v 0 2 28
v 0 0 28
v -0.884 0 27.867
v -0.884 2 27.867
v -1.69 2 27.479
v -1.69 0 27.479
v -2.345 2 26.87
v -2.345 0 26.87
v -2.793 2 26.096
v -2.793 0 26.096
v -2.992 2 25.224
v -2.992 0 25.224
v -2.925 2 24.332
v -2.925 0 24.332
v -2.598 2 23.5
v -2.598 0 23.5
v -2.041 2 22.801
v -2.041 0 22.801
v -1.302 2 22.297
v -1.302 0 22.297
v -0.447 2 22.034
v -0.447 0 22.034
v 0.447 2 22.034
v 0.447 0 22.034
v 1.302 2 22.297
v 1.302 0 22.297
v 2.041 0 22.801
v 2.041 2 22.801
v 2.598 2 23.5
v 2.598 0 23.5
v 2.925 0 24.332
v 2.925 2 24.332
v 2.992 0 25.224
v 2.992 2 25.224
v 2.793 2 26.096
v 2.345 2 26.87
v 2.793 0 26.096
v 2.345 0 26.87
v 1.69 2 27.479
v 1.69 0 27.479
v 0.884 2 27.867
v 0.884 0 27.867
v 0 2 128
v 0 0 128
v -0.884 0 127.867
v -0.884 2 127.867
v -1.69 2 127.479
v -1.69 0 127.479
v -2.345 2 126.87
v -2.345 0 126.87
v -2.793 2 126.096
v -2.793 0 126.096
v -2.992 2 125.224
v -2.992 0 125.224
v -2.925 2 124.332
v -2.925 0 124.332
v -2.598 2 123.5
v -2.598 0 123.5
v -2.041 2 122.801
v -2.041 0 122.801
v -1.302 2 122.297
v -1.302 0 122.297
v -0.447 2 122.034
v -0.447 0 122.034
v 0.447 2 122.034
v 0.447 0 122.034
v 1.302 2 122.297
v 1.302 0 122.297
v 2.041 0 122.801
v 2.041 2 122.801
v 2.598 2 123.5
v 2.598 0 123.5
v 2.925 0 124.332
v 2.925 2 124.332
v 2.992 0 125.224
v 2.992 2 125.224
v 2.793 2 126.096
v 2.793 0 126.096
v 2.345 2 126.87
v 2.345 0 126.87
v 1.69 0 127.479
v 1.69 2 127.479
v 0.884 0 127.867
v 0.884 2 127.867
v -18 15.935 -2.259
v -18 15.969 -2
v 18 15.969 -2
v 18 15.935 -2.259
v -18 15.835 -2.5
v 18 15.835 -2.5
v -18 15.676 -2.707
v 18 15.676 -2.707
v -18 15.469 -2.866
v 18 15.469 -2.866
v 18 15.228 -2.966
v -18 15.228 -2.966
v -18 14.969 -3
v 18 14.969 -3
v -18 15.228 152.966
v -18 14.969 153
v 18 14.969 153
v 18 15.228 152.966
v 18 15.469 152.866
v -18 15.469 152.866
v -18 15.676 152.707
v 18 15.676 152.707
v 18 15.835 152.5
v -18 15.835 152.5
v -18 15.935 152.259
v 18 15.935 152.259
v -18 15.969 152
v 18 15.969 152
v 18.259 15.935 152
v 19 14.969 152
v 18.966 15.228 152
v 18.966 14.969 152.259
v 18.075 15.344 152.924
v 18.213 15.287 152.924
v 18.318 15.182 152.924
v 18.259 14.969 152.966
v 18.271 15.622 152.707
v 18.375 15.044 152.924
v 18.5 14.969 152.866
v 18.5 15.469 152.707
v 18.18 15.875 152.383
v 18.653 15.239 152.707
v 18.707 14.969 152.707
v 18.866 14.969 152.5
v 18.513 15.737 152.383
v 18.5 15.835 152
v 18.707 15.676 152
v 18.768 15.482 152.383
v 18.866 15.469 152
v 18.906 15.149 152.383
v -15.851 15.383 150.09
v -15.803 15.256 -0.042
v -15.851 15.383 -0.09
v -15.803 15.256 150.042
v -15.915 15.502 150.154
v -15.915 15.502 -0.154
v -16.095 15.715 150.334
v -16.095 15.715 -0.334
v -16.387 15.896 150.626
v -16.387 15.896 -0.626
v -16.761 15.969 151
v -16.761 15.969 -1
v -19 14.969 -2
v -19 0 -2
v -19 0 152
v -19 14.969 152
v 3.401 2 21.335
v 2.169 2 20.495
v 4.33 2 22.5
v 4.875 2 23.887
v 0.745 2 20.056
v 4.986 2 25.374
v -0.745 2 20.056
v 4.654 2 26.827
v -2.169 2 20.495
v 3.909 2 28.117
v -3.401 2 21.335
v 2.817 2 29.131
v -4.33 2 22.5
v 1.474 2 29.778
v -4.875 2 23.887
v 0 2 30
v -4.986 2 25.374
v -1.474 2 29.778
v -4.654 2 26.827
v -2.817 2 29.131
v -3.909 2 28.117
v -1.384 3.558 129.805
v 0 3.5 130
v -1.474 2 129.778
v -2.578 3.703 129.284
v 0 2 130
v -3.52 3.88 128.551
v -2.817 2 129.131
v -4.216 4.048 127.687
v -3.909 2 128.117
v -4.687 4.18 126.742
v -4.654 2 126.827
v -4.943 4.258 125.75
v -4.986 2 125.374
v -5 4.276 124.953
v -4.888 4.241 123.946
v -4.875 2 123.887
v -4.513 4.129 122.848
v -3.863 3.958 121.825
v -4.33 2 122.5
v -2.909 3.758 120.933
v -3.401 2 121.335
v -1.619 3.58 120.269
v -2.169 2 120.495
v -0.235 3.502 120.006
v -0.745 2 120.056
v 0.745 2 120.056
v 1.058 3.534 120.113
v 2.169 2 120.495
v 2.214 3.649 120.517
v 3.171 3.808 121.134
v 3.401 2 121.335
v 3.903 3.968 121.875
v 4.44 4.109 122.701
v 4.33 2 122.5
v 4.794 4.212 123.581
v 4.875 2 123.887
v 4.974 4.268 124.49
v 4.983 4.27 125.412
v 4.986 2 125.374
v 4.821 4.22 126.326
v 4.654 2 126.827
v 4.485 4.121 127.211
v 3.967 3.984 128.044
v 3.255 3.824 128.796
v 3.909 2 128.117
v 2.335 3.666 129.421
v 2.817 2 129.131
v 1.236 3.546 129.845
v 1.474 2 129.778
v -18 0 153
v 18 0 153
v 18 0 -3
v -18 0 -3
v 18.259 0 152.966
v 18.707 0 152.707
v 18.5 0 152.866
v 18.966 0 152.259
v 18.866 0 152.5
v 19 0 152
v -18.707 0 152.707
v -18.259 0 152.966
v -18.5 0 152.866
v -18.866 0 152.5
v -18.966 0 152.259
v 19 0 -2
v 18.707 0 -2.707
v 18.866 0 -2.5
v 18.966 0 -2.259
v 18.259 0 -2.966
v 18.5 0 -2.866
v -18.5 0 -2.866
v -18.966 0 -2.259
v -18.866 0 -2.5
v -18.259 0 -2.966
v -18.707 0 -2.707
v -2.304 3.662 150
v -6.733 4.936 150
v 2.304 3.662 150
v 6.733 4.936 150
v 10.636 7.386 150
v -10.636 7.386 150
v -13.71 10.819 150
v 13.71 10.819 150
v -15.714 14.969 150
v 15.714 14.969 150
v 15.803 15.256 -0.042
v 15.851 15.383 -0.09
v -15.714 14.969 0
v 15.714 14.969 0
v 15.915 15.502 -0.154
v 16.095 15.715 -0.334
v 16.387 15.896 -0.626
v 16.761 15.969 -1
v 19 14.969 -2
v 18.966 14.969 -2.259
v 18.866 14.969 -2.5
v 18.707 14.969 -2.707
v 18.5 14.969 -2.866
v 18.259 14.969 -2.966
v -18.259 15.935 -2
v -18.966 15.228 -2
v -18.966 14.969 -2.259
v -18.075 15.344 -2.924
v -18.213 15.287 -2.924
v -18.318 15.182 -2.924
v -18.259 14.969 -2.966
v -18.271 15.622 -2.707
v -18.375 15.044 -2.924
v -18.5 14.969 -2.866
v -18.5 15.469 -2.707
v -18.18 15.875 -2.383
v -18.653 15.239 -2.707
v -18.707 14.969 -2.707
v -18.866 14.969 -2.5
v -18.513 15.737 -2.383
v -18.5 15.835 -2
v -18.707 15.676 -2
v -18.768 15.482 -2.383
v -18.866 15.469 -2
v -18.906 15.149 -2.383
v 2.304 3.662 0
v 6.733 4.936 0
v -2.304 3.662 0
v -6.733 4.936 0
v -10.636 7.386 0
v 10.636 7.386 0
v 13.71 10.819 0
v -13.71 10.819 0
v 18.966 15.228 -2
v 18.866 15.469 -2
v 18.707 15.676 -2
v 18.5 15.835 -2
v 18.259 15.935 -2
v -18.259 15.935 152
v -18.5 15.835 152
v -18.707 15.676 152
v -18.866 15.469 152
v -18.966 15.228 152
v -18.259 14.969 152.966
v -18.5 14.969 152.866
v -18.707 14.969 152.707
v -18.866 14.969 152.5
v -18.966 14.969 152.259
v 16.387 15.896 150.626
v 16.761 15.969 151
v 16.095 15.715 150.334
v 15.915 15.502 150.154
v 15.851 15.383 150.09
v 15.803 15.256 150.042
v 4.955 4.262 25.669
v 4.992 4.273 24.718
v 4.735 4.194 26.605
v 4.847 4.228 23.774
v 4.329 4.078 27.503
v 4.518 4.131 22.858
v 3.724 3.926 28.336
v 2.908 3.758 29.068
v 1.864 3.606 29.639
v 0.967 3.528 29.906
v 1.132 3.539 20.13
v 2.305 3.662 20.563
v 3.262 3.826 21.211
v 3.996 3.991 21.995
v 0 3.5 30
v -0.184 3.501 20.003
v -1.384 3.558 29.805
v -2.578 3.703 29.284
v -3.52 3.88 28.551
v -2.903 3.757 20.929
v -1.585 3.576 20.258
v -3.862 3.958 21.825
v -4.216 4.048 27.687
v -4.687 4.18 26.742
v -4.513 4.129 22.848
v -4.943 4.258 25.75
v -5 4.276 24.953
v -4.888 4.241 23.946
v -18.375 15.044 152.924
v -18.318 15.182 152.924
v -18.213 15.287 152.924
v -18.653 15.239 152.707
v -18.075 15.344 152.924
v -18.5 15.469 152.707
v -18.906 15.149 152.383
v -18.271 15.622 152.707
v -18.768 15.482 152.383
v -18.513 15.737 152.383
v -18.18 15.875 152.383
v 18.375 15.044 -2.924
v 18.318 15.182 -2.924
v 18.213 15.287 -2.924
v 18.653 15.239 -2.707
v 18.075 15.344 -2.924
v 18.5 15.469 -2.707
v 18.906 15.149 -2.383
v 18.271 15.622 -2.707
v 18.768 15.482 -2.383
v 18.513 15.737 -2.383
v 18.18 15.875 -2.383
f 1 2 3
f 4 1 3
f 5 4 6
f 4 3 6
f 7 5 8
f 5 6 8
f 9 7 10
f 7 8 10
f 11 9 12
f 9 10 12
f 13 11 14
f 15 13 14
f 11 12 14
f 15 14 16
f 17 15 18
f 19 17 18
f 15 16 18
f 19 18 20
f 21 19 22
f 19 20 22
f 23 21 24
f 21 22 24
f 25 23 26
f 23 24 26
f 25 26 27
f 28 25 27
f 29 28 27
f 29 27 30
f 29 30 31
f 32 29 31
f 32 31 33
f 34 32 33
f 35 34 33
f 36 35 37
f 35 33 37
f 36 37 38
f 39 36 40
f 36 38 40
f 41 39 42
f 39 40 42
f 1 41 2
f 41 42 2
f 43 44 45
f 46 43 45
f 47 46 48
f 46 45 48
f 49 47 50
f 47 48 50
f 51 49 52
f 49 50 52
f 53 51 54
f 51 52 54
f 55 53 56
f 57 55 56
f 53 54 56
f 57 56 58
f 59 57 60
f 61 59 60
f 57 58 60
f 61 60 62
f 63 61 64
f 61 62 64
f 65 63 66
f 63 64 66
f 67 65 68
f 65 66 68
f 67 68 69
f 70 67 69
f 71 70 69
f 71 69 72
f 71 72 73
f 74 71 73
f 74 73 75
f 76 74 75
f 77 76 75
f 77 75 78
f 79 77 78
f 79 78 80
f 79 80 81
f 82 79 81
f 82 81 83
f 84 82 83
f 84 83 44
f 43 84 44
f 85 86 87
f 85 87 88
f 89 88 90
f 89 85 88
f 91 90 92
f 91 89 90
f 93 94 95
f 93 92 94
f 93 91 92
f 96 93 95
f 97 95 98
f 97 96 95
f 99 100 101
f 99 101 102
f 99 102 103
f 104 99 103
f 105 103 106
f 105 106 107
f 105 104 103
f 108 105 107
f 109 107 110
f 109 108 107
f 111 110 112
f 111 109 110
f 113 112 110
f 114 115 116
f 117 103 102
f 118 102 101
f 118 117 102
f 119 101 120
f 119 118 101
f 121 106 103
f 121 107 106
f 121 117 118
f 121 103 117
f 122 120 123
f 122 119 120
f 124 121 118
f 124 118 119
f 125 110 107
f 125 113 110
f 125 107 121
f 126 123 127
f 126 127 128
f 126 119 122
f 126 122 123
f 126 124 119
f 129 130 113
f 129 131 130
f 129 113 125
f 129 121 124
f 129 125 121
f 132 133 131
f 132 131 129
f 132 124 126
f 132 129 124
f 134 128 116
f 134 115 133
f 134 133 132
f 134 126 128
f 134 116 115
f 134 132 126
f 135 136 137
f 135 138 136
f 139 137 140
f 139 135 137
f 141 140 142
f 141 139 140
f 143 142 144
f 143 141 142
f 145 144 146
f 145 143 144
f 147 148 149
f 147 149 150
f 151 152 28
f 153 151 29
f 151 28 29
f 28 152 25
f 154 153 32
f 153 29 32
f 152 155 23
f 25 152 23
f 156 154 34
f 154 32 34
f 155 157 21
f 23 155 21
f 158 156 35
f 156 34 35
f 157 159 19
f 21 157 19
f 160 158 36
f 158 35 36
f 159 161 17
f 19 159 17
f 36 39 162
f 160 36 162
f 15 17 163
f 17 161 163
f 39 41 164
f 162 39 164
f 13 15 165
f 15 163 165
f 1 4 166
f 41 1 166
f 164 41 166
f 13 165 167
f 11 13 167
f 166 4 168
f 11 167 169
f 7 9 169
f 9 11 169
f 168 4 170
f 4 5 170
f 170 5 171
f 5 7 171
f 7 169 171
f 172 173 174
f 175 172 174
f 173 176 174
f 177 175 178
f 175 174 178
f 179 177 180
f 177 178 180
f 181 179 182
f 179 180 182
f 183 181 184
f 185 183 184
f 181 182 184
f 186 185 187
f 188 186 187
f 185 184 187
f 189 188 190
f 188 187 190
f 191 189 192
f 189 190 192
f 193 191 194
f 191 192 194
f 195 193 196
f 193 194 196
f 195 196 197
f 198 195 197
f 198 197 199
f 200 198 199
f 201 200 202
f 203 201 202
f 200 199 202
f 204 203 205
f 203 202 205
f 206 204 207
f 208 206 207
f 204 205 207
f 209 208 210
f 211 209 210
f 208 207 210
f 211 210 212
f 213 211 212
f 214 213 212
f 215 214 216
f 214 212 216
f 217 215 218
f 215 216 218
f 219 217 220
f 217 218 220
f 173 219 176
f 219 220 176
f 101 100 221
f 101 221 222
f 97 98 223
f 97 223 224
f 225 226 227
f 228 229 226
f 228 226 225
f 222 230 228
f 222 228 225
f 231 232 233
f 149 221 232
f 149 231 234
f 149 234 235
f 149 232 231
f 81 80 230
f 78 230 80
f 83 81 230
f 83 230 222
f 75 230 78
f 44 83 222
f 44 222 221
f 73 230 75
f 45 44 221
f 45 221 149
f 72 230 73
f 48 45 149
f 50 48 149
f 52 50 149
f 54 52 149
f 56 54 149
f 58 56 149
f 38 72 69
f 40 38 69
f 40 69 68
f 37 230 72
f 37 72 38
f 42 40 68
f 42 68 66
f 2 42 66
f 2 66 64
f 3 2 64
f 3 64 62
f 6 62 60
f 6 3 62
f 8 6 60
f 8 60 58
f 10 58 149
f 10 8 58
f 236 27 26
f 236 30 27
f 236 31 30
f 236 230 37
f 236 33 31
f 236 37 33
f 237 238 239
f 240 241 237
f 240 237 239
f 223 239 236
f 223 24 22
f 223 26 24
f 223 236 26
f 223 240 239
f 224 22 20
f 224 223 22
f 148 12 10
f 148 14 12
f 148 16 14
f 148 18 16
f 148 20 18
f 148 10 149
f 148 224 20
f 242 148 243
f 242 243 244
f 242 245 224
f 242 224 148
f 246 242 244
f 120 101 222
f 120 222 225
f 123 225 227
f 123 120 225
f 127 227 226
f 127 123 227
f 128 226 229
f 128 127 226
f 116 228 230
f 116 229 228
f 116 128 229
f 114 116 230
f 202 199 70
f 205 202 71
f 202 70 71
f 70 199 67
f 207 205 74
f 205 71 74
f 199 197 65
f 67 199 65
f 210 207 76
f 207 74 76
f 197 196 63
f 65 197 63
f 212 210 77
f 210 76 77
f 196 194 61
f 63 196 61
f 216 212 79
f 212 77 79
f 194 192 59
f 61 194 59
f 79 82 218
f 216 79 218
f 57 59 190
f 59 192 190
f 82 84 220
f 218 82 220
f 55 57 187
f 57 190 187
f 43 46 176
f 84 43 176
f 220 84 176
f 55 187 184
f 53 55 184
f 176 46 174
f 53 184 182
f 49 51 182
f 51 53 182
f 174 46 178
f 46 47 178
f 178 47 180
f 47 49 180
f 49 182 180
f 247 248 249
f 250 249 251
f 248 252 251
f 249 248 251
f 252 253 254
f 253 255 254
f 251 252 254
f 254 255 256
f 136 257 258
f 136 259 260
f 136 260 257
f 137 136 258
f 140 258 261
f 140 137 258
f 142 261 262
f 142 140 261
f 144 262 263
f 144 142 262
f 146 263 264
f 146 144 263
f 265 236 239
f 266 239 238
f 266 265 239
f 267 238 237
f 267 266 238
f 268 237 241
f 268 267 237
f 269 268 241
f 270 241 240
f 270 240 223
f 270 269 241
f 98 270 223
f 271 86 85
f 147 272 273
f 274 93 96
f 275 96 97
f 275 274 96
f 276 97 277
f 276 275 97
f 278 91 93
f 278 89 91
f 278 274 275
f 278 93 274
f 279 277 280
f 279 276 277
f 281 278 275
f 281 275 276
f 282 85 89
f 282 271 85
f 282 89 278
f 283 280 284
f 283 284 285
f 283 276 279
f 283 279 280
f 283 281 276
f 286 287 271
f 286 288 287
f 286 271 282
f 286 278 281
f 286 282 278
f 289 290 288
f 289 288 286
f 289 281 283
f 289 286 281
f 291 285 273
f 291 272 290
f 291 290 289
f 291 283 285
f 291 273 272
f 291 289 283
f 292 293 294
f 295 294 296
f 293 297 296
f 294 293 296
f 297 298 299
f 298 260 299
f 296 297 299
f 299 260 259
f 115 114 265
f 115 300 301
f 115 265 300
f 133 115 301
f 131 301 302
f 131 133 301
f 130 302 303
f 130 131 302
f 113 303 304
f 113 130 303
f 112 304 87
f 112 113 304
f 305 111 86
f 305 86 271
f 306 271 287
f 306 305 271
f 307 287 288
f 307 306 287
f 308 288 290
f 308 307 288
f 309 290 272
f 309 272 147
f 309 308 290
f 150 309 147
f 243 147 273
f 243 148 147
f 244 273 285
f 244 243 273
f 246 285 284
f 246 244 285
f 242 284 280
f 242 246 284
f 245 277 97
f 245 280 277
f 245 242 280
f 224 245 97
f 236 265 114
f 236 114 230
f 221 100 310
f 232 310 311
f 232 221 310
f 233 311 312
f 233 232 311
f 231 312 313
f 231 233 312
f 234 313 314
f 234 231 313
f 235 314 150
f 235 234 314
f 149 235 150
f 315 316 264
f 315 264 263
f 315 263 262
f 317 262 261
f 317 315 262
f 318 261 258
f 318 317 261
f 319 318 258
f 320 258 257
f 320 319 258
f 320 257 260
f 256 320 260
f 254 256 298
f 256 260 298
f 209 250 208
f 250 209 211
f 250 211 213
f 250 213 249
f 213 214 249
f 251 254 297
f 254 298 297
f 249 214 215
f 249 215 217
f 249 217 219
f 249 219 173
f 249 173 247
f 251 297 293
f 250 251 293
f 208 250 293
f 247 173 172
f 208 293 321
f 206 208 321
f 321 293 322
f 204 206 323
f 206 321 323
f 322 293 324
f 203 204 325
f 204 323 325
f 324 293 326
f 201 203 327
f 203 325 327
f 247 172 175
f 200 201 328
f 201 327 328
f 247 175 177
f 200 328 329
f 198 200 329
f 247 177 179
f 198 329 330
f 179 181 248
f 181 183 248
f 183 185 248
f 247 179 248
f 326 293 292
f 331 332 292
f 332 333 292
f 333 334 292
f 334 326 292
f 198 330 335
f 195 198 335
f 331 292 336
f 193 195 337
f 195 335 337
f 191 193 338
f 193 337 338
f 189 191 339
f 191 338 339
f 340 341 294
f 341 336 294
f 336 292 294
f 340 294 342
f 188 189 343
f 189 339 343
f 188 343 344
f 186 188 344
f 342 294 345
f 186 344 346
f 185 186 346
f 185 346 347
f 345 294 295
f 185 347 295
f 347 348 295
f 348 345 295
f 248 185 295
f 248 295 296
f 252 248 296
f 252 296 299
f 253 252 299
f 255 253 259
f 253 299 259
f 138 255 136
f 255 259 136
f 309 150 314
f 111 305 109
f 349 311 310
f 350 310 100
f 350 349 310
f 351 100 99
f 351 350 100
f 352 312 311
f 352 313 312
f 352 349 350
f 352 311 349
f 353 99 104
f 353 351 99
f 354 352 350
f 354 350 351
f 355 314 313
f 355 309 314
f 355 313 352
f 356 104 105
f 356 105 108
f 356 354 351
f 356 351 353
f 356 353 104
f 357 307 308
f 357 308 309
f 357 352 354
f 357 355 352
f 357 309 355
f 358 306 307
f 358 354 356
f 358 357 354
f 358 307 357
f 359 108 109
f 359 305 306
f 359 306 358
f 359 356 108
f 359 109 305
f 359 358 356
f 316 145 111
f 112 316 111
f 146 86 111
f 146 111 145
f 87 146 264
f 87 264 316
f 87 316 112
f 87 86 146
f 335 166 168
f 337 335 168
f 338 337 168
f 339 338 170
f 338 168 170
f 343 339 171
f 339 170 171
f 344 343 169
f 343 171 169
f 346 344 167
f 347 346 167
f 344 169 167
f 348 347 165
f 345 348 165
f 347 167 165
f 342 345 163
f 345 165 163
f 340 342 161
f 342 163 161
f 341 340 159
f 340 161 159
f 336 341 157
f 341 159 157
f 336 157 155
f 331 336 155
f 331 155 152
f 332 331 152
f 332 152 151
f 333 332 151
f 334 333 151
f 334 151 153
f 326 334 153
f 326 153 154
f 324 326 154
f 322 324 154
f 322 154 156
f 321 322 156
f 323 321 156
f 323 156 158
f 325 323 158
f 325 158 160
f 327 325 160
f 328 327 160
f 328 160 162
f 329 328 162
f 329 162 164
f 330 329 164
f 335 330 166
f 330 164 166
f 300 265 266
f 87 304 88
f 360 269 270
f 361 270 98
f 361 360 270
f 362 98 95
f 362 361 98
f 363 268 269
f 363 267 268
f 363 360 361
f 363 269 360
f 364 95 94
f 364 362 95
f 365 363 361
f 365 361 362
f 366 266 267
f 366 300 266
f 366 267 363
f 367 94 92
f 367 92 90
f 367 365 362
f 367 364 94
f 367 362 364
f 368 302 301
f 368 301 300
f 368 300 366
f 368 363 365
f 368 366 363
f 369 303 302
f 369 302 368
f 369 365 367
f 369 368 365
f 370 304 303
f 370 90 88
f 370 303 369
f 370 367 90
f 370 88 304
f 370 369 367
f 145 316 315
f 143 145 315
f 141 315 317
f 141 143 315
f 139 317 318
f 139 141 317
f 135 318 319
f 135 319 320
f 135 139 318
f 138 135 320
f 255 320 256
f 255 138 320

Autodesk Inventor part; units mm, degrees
ref_plane "YZ Plane" through (0, 0, 0) normal (1, 0, 0) x (0, 1, 0)
ref_plane "XZ Plane" through (0, 0, 0) normal (0, 1, 0) x (-1, 0, 0)
ref_plane "XY Plane" through (0, 0, 0) normal (0, 0, 1) x (1, 0, 0)
sketch "Sketch3" plane through (0, 0, 0) normal (0, 0, 1) x (1, 0, 0)
  line L0 (-19, 0) -> (19, 0)
  arc A0 (-16, 15.9689) -> (16, 15.9689) centre (0, 20) ccw
  line L1 (0, -4) -> (0, 24) projected
  line L2 (-26.6, 0) -> (26.6, 0) projected
  line L3 (-16, 15.9689) -> (-19, 15.9689)
  line L4 (-19, 15.9689) -> (-19, 0)
  line L5 (16, 15.9689) -> (19, 15.9689)
  line L6 (19, 15.9689) -> (19, 0)
  point P0 (0, 0)
  point P1 (-17.5, 15.9689)
  point P2 (17.5, 15.9689)
  dimension "d6" = 16.5
  dimension "d9" = 20
  dimension "d12" = 38
  dimension "d13" = 3
  dimension "d14" = 3
extrude "Extrusion3" add sketch "Sketch3" along normal blind 150
ref_plane "Work Plane1" through (0, 0, 75) normal (0, 0, 1) x (1, 0, 0)
sketch "Sketch4" plane through (0, 0, 0) normal (0, 0, -1) x (-1, 0, 0)
  line L0 (-19, 0) -> (-19, 15.9689) projected
  line L1 (19, 15.9689) -> (19, 0) projected
  line L2 (-19, 15.9689) -> (19, 15.9689)
  line L3 (19, 15.9689) -> (19, 0)
  line L4 (19, 0) -> (-19, 0)
  line L5 (-19, 0) -> (-19, 15.9689)
  point P0 (0, 0)
  point P1 (19, 15.9689)
extrude "Extrusion4" add sketch "Sketch4" along normal blind 3
mirror "Mirror1" about plane through (0, 0, 75) normal (0, 0, 1) of "Extrusion4"
fillet "Fillet1" radius 1 12 edges at (-16, 15.9689, 75) (-19, 15.9689, 75) (19, 15.9689, 75) (16, 15.9689, 75) (0, 15.9689, 150) (0, 15.9689, 153) (0, 15.9689, -3) (0, 15.9689, 0) (19, 7.9844, -3) (19, 7.9844, 153) (-19, 7.9844, 153) (-19, 7.9844, -3)
ref_plane "Work Plane2" through (-18, 4.5, -3) normal (0, -1, 0) x (1, 0, 0)
sketch "Sketch5" plane through (-18, 4.5, -3) normal (0, -1, 0) x (1, 0, 0)
  line L0 (-1, 1) -> (-1, 155) projected
  line L1 (0, 156) -> (36, 156) projected
  line L2 (36, 0) -> (0, 0) projected
  point P0 (18, 3)
  point P1 (18, 128)
  point P2 (18, 28)
  dimension "d20" = 19
  dimension "d21" = 100
  dimension "d22" = 28
  dimension "d23" = 28
hole "Hole1" at (0, 4.5, 125) at (0, 4.5, 25) direction (0, -1, 0) diameter 6 end through all counterbore diameter 10 counterbore depth 2.5
properties part number "Disk_Holder_3DPrint"
